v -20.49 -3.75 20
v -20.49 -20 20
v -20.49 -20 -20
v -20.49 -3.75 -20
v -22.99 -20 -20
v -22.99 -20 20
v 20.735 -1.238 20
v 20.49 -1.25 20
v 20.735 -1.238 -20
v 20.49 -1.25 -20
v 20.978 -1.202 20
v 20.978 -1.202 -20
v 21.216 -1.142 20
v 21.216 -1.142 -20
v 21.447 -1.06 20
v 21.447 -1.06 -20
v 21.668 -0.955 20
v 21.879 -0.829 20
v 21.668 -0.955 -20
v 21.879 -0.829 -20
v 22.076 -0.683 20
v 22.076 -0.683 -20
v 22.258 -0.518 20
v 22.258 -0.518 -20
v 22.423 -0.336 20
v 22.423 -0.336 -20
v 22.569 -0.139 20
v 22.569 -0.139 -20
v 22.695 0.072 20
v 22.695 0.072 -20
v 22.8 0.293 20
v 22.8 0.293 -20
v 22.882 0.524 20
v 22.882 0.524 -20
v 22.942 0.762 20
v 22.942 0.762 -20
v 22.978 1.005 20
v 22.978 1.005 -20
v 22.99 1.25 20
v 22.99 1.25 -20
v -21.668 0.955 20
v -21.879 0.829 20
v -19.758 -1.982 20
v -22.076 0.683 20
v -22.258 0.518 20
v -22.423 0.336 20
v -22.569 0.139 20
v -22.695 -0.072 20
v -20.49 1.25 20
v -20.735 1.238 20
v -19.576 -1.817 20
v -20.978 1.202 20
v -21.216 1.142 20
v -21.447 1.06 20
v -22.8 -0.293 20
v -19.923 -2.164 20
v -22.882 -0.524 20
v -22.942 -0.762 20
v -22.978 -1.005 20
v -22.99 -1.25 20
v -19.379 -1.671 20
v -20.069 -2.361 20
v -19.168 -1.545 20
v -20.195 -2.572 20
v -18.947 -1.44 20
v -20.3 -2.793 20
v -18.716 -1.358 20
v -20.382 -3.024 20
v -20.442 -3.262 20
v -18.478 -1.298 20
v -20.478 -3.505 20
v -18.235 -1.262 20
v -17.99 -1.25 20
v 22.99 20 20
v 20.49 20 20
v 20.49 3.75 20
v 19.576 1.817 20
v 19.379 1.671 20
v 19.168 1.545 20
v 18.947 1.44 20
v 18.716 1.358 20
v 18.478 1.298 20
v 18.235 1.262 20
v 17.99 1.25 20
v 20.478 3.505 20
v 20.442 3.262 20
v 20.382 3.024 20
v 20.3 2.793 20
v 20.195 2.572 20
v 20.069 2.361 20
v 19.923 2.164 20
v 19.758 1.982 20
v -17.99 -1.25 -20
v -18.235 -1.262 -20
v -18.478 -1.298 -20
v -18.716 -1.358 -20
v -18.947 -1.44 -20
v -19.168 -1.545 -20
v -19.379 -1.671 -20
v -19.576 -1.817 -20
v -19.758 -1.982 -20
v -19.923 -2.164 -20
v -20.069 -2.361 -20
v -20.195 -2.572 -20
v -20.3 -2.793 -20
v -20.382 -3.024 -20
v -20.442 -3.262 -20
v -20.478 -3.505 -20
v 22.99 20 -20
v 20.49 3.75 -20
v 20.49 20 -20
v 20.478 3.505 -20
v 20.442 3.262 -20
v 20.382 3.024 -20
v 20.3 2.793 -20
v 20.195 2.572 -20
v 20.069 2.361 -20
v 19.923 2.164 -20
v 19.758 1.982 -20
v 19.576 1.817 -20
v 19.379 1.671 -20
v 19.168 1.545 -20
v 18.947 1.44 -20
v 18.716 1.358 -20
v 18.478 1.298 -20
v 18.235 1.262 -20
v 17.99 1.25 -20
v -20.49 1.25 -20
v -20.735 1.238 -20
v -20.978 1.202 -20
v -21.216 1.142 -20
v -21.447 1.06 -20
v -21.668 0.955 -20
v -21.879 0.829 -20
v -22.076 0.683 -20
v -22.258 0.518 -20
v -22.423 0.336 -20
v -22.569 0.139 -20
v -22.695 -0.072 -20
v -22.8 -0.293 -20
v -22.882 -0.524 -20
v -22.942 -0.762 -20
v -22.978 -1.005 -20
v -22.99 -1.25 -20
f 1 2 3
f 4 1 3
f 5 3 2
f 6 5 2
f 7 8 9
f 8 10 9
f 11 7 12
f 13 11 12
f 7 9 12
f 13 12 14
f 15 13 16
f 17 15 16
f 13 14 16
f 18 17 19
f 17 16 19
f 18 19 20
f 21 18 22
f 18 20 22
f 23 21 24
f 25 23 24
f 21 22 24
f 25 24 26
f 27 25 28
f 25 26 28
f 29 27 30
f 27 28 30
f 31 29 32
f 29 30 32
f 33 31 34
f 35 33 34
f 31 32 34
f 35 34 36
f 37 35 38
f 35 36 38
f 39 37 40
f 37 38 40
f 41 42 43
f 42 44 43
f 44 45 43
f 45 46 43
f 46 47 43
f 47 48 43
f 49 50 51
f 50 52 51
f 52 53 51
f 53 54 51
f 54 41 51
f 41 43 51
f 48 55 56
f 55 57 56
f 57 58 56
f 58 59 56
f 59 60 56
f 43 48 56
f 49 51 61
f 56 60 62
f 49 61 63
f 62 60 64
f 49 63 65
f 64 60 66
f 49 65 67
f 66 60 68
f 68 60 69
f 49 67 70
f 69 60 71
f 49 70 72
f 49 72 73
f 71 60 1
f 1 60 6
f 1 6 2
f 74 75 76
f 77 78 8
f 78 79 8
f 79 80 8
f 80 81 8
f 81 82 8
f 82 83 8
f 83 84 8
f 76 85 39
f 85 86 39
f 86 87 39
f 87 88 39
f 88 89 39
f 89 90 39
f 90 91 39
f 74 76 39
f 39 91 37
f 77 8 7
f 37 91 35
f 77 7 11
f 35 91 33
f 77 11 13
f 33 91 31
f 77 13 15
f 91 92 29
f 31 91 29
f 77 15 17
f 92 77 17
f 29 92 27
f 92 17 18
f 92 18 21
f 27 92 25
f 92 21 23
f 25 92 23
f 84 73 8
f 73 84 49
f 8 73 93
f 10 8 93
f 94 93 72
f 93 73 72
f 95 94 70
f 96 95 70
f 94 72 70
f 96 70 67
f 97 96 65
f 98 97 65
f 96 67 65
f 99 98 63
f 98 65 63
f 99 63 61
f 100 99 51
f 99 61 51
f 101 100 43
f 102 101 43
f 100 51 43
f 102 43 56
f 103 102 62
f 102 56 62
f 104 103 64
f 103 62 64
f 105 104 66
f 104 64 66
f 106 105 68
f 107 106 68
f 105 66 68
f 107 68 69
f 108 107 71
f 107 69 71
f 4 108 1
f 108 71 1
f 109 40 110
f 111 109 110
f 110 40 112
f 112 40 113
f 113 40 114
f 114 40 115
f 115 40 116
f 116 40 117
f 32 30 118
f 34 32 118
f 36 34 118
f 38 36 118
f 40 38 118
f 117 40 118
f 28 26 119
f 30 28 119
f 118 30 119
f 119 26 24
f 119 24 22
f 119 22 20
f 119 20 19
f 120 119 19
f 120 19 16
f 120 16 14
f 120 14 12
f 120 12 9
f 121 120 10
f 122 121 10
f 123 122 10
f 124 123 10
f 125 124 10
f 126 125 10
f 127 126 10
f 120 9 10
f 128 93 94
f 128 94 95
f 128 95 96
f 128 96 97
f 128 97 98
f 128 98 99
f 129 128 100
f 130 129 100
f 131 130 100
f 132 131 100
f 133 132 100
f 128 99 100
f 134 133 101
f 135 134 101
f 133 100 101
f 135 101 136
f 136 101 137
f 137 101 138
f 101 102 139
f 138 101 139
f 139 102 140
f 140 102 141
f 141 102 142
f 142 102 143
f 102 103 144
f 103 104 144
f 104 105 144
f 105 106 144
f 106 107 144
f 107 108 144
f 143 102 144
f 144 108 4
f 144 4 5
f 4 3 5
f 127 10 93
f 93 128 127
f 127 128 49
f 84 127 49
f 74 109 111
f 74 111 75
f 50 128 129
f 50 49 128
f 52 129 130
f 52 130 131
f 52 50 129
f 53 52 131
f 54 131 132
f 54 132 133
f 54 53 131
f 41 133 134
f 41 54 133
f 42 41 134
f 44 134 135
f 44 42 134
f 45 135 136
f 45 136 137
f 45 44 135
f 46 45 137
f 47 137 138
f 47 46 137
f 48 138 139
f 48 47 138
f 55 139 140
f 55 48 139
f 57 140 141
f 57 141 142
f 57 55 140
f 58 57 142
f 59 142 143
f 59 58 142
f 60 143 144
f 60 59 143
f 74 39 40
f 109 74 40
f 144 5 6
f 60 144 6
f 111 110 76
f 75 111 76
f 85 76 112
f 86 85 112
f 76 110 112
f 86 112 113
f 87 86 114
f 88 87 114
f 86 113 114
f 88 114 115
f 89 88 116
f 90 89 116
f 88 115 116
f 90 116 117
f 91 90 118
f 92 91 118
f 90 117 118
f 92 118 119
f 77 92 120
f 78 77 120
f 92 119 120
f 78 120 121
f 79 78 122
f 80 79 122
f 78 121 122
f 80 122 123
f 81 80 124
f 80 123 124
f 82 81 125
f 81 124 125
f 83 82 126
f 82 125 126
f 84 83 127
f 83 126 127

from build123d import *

# Parameters (mm, degrees)
SKETCH_2_W = 40
SKETCH_2_H = 2.5
FILLET_1_R = 2.5
FILLET_2_R = 2.5
FILLET_3_R = 2.5


with BuildPart() as part:
    # 扫描1: sweep along a path in 草图3
    with BuildLine(Plane.XY) as sweep_1_path:
        Line((21.74, 20), (21.74, 0))
        Line((21.74, 0), (0, 0))
        Line((0, 0), (-21.74, 0))
        Line((-21.74, 0), (-21.74, -20))
    # 草图2 → 扫描1 (sweep)
    with BuildSketch(Plane(origin=(0, 0, 0), x_dir=(0, 0, -1), z_dir=(1, 0, 0))):
        Rectangle(SKETCH_2_W, SKETCH_2_H)
    sweep(path=sweep_1_path.line, transition=Transition.RIGHT)

    # 圆角1
    fillet_1_edges = [part.edges().sort_by_distance(p)[0] for p in [
        (-22.99, 1.25, 0),
    ]]
    fillet(fillet_1_edges, radius=FILLET_1_R)

    # 圆角2
    fillet_2_edges = [part.edges().sort_by_distance(p)[0] for p in [
        (22.99, -1.25, 0),
    ]]
    fillet(fillet_2_edges, radius=FILLET_2_R)

    # 圆角3
    fillet_3_edges = [part.edges().sort_by_distance(p)[0] for p in [
        (-20.49, -1.25, 0),
        (20.49, 1.25, 0),
    ]]
    fillet(fillet_3_edges, radius=FILLET_3_R)


solid = part.part
